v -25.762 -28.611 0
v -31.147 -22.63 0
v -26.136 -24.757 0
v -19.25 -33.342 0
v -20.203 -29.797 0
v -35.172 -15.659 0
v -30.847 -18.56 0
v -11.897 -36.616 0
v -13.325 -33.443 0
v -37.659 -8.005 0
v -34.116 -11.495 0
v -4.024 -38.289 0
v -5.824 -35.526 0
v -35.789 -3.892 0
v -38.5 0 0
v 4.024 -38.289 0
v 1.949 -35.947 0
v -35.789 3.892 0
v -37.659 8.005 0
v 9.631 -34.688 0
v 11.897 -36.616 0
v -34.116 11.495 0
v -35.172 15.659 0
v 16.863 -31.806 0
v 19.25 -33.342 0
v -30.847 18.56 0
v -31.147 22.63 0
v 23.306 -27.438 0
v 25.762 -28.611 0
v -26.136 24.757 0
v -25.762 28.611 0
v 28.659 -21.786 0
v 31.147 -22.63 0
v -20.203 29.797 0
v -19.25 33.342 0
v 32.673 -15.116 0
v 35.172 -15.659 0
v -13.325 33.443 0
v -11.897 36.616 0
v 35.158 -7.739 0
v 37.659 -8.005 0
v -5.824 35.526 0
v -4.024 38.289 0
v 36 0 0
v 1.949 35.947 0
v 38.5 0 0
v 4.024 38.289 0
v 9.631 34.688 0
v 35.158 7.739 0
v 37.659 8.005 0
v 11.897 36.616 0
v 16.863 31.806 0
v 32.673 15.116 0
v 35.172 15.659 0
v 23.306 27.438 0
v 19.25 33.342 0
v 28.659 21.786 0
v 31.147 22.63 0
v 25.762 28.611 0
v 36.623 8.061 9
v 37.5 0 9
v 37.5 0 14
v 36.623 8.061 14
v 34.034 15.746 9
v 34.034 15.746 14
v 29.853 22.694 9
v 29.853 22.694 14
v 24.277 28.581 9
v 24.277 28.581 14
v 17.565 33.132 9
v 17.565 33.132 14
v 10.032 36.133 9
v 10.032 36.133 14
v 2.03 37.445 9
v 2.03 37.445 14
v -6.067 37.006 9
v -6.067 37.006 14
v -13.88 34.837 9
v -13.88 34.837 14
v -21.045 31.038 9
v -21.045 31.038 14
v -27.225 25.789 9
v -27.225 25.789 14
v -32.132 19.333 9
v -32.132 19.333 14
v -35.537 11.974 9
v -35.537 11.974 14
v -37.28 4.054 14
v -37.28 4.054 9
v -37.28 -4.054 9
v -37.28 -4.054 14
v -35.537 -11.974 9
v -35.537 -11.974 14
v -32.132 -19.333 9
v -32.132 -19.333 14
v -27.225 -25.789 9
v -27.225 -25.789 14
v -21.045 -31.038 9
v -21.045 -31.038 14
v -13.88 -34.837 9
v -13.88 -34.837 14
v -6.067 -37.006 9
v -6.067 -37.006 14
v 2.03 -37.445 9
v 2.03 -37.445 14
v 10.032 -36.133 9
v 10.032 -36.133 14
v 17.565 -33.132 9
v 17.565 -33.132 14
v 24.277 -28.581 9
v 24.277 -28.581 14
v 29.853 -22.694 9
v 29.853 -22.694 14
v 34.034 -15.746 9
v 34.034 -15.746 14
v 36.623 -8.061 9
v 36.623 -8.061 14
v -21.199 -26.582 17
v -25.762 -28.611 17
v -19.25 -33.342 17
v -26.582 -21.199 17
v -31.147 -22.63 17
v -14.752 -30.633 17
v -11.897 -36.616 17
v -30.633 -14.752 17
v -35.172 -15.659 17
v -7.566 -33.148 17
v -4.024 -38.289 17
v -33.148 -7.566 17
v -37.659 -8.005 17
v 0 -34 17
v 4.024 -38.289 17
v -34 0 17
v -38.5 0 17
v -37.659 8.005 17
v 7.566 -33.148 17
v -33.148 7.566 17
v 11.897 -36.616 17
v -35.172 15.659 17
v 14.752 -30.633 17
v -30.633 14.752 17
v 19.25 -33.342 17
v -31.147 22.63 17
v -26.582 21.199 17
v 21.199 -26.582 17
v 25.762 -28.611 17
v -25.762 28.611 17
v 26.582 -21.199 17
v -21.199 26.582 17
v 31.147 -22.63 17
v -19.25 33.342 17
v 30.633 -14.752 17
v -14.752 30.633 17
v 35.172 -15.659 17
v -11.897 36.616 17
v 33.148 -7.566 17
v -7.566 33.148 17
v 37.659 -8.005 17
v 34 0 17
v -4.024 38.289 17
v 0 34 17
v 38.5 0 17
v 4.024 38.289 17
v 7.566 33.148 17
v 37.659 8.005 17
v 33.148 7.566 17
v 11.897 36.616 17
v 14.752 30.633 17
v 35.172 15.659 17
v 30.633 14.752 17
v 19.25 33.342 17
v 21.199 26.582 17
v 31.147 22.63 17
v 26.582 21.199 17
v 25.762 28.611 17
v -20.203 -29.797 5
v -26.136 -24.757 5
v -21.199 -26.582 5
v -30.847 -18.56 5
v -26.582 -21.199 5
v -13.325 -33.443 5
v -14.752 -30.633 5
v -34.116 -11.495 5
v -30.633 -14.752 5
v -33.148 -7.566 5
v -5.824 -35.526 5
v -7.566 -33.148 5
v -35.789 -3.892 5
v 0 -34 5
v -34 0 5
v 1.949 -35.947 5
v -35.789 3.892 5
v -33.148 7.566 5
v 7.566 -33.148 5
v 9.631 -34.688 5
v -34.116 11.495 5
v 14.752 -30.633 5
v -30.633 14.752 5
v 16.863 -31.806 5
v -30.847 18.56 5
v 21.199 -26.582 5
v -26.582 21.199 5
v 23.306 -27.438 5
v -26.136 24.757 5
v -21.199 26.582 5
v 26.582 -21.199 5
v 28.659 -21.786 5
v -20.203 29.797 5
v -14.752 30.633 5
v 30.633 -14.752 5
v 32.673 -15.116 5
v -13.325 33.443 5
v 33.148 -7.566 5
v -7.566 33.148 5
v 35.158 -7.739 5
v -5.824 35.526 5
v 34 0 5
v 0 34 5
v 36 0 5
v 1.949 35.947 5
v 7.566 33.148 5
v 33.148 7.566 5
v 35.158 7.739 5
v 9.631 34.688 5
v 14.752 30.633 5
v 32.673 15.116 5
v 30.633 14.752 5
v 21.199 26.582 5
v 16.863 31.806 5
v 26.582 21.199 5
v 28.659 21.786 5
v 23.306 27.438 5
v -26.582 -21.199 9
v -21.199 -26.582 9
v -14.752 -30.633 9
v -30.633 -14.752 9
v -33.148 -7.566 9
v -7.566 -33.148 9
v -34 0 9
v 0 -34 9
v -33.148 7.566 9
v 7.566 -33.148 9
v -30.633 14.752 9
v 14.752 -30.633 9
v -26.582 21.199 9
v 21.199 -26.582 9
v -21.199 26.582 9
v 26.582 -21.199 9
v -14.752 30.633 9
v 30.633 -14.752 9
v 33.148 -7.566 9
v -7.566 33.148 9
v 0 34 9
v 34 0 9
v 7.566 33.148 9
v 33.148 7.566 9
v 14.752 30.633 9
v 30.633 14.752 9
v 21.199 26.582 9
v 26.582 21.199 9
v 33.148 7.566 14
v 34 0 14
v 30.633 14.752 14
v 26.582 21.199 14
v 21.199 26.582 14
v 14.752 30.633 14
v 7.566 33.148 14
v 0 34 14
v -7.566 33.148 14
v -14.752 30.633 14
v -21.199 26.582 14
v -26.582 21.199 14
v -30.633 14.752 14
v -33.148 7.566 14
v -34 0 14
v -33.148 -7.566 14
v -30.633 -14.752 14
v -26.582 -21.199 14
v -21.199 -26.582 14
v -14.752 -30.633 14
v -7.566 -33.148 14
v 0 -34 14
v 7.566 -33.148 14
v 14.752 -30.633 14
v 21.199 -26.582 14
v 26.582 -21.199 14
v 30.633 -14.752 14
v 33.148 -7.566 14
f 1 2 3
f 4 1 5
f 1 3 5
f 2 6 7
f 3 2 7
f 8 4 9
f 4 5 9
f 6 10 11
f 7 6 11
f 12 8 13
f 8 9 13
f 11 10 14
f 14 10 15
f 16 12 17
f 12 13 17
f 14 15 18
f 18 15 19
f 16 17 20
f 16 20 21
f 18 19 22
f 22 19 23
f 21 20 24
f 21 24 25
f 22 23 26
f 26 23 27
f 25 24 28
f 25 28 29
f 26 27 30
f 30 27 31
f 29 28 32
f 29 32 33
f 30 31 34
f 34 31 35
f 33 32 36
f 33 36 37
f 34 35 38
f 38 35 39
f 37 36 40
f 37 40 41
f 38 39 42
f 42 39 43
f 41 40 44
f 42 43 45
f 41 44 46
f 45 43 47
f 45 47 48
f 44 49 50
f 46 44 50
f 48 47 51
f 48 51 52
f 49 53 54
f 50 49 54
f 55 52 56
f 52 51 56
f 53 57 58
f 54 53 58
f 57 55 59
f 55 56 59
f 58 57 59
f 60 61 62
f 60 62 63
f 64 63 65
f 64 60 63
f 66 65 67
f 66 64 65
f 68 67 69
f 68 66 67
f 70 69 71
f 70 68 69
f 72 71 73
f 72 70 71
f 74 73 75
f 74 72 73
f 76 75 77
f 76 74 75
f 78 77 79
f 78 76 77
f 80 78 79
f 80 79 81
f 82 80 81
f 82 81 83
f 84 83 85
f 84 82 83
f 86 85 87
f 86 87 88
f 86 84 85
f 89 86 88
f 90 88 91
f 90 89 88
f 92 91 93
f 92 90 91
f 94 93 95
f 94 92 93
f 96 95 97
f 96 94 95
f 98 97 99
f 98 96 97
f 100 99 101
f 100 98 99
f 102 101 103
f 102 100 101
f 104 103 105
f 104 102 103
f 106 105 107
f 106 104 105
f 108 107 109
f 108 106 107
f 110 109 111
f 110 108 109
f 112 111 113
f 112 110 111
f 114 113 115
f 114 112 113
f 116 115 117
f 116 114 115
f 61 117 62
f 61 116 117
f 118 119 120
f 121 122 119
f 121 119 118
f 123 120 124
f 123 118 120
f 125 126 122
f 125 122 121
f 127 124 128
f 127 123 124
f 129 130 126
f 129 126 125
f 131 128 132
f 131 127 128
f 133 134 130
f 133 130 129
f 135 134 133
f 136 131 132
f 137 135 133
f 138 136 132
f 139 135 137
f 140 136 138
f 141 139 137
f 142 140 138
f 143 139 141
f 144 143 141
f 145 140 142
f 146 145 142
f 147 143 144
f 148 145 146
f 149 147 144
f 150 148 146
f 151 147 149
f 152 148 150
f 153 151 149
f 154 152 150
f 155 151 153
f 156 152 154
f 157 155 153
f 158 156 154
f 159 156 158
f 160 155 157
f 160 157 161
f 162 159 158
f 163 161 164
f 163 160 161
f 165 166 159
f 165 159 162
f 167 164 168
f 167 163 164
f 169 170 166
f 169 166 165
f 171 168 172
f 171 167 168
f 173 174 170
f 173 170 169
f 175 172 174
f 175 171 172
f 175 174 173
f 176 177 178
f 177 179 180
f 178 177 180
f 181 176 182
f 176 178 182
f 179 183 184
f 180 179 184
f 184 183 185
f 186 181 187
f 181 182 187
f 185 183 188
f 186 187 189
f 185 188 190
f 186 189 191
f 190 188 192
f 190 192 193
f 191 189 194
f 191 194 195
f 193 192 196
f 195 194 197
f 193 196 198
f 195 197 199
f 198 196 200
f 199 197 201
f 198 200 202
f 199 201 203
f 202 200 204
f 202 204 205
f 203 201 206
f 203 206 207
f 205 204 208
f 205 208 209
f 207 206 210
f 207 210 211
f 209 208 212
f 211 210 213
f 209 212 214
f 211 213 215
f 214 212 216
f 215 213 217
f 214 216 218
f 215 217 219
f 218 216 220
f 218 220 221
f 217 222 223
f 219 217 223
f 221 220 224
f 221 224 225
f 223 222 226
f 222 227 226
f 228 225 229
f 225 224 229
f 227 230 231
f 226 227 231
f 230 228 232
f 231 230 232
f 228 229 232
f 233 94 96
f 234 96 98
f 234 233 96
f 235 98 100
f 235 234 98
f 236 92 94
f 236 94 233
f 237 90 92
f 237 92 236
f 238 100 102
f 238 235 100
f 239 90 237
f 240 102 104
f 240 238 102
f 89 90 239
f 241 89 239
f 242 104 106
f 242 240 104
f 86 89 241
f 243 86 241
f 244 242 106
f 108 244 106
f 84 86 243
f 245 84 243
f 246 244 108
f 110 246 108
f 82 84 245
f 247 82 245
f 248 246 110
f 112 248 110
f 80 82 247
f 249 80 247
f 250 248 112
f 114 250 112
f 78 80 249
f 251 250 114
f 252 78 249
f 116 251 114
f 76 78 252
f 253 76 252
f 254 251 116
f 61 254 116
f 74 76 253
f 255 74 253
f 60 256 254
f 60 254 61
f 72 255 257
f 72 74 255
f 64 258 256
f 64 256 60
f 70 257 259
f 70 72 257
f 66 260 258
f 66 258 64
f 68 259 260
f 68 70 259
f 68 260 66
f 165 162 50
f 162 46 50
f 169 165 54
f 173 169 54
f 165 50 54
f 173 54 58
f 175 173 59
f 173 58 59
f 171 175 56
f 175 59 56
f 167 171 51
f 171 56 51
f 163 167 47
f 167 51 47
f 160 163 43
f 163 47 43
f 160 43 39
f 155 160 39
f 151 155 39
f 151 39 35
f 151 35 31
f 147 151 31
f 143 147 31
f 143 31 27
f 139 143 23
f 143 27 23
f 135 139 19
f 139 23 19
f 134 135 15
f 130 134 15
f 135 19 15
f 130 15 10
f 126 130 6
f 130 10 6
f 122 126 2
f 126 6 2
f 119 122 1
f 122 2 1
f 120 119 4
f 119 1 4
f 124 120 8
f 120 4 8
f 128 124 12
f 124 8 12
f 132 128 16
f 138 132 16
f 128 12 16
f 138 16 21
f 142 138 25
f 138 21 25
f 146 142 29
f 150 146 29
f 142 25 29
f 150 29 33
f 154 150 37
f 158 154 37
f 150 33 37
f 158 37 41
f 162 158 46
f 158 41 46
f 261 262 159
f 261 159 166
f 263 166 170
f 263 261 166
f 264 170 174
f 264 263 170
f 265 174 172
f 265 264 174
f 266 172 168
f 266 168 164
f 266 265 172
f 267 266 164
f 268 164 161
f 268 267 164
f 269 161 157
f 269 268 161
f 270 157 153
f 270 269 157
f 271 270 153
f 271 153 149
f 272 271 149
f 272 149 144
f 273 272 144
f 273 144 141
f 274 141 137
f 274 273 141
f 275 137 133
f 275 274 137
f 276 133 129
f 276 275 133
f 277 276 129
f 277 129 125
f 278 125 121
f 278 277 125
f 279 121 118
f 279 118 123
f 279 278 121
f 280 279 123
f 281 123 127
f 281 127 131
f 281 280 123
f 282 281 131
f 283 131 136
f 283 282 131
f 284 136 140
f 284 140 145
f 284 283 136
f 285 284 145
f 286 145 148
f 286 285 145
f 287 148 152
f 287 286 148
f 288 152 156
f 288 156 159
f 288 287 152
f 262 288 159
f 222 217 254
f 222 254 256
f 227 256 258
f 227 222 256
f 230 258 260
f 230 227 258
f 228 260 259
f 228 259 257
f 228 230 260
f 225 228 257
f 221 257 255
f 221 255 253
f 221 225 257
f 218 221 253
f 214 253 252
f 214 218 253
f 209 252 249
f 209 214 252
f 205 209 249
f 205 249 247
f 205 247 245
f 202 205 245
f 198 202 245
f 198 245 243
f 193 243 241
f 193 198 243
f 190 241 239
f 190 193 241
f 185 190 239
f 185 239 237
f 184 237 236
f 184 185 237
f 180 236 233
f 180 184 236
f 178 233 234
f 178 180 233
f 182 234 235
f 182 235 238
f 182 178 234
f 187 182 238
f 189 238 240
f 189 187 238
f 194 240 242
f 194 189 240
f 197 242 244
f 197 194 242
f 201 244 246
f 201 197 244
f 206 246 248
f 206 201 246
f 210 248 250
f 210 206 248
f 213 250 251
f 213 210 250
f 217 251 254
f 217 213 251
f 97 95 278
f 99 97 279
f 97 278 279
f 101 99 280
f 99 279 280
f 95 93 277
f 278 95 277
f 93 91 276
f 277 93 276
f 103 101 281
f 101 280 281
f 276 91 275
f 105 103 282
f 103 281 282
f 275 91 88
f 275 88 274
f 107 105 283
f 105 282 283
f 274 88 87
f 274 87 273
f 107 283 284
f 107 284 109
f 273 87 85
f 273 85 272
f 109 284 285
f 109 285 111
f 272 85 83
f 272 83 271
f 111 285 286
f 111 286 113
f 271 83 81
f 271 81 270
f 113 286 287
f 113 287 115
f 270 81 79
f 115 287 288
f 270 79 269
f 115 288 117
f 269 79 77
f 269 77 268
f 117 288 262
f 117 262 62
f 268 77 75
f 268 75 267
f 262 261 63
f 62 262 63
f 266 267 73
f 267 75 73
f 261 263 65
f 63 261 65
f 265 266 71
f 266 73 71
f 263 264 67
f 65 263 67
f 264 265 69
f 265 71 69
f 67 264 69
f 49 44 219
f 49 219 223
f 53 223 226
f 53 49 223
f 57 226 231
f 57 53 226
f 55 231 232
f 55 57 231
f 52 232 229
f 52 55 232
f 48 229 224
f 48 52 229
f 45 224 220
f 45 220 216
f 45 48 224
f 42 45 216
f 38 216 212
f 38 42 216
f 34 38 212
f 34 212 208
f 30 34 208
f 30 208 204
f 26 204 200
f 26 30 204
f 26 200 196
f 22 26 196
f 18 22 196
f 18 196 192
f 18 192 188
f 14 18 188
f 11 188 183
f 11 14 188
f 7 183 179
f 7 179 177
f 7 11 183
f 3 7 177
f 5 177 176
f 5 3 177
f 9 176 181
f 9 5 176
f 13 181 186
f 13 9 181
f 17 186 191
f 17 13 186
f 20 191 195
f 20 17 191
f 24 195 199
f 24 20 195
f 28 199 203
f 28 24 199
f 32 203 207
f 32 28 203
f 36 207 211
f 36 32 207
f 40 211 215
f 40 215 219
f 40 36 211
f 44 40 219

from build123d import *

# Parameters (mm, degrees)
F0_R     = 38.5
F0_R_2   = 36
F1_DEPTH = 5
F2_R     = 38.5
F2_R_2   = 36
F2_R_3   = 34
F3_DEPTH = 4
F4_R     = 38.5
F4_R_2   = 37.5
F5_DEPTH = 5
F6_R     = 38.5
F6_R_2   = 34
F7_DEPTH = 3


with BuildPart() as f1:
    # F0 (on Top) → F1 (new body)
    with BuildSketch(Plane.XY):
        Circle(F0_R)
        Circle(F0_R_2, mode=Mode.SUBTRACT)
    extrude(amount=F1_DEPTH)

    # F2 (on face) → F3 (join)
    with BuildSketch(Plane.XY.offset(5)):
        Circle(F2_R)
        Circle(F2_R_2, mode=Mode.SUBTRACT)
        Circle(F2_R_2)
        Circle(F2_R_3, mode=Mode.SUBTRACT)
    extrude(amount=F3_DEPTH)

    # F4 (on face) → F5 (join)
    with BuildSketch(Plane.XY.offset(9)):
        Circle(F4_R)
        Circle(F4_R_2, mode=Mode.SUBTRACT)
    extrude(amount=F5_DEPTH)

    # F6 (on face) → F7 (join)
    with BuildSketch(Plane.XY.offset(14)):
        Circle(F6_R)
        Circle(F6_R_2, mode=Mode.SUBTRACT)
    extrude(amount=F7_DEPTH)


solid = f1.part
